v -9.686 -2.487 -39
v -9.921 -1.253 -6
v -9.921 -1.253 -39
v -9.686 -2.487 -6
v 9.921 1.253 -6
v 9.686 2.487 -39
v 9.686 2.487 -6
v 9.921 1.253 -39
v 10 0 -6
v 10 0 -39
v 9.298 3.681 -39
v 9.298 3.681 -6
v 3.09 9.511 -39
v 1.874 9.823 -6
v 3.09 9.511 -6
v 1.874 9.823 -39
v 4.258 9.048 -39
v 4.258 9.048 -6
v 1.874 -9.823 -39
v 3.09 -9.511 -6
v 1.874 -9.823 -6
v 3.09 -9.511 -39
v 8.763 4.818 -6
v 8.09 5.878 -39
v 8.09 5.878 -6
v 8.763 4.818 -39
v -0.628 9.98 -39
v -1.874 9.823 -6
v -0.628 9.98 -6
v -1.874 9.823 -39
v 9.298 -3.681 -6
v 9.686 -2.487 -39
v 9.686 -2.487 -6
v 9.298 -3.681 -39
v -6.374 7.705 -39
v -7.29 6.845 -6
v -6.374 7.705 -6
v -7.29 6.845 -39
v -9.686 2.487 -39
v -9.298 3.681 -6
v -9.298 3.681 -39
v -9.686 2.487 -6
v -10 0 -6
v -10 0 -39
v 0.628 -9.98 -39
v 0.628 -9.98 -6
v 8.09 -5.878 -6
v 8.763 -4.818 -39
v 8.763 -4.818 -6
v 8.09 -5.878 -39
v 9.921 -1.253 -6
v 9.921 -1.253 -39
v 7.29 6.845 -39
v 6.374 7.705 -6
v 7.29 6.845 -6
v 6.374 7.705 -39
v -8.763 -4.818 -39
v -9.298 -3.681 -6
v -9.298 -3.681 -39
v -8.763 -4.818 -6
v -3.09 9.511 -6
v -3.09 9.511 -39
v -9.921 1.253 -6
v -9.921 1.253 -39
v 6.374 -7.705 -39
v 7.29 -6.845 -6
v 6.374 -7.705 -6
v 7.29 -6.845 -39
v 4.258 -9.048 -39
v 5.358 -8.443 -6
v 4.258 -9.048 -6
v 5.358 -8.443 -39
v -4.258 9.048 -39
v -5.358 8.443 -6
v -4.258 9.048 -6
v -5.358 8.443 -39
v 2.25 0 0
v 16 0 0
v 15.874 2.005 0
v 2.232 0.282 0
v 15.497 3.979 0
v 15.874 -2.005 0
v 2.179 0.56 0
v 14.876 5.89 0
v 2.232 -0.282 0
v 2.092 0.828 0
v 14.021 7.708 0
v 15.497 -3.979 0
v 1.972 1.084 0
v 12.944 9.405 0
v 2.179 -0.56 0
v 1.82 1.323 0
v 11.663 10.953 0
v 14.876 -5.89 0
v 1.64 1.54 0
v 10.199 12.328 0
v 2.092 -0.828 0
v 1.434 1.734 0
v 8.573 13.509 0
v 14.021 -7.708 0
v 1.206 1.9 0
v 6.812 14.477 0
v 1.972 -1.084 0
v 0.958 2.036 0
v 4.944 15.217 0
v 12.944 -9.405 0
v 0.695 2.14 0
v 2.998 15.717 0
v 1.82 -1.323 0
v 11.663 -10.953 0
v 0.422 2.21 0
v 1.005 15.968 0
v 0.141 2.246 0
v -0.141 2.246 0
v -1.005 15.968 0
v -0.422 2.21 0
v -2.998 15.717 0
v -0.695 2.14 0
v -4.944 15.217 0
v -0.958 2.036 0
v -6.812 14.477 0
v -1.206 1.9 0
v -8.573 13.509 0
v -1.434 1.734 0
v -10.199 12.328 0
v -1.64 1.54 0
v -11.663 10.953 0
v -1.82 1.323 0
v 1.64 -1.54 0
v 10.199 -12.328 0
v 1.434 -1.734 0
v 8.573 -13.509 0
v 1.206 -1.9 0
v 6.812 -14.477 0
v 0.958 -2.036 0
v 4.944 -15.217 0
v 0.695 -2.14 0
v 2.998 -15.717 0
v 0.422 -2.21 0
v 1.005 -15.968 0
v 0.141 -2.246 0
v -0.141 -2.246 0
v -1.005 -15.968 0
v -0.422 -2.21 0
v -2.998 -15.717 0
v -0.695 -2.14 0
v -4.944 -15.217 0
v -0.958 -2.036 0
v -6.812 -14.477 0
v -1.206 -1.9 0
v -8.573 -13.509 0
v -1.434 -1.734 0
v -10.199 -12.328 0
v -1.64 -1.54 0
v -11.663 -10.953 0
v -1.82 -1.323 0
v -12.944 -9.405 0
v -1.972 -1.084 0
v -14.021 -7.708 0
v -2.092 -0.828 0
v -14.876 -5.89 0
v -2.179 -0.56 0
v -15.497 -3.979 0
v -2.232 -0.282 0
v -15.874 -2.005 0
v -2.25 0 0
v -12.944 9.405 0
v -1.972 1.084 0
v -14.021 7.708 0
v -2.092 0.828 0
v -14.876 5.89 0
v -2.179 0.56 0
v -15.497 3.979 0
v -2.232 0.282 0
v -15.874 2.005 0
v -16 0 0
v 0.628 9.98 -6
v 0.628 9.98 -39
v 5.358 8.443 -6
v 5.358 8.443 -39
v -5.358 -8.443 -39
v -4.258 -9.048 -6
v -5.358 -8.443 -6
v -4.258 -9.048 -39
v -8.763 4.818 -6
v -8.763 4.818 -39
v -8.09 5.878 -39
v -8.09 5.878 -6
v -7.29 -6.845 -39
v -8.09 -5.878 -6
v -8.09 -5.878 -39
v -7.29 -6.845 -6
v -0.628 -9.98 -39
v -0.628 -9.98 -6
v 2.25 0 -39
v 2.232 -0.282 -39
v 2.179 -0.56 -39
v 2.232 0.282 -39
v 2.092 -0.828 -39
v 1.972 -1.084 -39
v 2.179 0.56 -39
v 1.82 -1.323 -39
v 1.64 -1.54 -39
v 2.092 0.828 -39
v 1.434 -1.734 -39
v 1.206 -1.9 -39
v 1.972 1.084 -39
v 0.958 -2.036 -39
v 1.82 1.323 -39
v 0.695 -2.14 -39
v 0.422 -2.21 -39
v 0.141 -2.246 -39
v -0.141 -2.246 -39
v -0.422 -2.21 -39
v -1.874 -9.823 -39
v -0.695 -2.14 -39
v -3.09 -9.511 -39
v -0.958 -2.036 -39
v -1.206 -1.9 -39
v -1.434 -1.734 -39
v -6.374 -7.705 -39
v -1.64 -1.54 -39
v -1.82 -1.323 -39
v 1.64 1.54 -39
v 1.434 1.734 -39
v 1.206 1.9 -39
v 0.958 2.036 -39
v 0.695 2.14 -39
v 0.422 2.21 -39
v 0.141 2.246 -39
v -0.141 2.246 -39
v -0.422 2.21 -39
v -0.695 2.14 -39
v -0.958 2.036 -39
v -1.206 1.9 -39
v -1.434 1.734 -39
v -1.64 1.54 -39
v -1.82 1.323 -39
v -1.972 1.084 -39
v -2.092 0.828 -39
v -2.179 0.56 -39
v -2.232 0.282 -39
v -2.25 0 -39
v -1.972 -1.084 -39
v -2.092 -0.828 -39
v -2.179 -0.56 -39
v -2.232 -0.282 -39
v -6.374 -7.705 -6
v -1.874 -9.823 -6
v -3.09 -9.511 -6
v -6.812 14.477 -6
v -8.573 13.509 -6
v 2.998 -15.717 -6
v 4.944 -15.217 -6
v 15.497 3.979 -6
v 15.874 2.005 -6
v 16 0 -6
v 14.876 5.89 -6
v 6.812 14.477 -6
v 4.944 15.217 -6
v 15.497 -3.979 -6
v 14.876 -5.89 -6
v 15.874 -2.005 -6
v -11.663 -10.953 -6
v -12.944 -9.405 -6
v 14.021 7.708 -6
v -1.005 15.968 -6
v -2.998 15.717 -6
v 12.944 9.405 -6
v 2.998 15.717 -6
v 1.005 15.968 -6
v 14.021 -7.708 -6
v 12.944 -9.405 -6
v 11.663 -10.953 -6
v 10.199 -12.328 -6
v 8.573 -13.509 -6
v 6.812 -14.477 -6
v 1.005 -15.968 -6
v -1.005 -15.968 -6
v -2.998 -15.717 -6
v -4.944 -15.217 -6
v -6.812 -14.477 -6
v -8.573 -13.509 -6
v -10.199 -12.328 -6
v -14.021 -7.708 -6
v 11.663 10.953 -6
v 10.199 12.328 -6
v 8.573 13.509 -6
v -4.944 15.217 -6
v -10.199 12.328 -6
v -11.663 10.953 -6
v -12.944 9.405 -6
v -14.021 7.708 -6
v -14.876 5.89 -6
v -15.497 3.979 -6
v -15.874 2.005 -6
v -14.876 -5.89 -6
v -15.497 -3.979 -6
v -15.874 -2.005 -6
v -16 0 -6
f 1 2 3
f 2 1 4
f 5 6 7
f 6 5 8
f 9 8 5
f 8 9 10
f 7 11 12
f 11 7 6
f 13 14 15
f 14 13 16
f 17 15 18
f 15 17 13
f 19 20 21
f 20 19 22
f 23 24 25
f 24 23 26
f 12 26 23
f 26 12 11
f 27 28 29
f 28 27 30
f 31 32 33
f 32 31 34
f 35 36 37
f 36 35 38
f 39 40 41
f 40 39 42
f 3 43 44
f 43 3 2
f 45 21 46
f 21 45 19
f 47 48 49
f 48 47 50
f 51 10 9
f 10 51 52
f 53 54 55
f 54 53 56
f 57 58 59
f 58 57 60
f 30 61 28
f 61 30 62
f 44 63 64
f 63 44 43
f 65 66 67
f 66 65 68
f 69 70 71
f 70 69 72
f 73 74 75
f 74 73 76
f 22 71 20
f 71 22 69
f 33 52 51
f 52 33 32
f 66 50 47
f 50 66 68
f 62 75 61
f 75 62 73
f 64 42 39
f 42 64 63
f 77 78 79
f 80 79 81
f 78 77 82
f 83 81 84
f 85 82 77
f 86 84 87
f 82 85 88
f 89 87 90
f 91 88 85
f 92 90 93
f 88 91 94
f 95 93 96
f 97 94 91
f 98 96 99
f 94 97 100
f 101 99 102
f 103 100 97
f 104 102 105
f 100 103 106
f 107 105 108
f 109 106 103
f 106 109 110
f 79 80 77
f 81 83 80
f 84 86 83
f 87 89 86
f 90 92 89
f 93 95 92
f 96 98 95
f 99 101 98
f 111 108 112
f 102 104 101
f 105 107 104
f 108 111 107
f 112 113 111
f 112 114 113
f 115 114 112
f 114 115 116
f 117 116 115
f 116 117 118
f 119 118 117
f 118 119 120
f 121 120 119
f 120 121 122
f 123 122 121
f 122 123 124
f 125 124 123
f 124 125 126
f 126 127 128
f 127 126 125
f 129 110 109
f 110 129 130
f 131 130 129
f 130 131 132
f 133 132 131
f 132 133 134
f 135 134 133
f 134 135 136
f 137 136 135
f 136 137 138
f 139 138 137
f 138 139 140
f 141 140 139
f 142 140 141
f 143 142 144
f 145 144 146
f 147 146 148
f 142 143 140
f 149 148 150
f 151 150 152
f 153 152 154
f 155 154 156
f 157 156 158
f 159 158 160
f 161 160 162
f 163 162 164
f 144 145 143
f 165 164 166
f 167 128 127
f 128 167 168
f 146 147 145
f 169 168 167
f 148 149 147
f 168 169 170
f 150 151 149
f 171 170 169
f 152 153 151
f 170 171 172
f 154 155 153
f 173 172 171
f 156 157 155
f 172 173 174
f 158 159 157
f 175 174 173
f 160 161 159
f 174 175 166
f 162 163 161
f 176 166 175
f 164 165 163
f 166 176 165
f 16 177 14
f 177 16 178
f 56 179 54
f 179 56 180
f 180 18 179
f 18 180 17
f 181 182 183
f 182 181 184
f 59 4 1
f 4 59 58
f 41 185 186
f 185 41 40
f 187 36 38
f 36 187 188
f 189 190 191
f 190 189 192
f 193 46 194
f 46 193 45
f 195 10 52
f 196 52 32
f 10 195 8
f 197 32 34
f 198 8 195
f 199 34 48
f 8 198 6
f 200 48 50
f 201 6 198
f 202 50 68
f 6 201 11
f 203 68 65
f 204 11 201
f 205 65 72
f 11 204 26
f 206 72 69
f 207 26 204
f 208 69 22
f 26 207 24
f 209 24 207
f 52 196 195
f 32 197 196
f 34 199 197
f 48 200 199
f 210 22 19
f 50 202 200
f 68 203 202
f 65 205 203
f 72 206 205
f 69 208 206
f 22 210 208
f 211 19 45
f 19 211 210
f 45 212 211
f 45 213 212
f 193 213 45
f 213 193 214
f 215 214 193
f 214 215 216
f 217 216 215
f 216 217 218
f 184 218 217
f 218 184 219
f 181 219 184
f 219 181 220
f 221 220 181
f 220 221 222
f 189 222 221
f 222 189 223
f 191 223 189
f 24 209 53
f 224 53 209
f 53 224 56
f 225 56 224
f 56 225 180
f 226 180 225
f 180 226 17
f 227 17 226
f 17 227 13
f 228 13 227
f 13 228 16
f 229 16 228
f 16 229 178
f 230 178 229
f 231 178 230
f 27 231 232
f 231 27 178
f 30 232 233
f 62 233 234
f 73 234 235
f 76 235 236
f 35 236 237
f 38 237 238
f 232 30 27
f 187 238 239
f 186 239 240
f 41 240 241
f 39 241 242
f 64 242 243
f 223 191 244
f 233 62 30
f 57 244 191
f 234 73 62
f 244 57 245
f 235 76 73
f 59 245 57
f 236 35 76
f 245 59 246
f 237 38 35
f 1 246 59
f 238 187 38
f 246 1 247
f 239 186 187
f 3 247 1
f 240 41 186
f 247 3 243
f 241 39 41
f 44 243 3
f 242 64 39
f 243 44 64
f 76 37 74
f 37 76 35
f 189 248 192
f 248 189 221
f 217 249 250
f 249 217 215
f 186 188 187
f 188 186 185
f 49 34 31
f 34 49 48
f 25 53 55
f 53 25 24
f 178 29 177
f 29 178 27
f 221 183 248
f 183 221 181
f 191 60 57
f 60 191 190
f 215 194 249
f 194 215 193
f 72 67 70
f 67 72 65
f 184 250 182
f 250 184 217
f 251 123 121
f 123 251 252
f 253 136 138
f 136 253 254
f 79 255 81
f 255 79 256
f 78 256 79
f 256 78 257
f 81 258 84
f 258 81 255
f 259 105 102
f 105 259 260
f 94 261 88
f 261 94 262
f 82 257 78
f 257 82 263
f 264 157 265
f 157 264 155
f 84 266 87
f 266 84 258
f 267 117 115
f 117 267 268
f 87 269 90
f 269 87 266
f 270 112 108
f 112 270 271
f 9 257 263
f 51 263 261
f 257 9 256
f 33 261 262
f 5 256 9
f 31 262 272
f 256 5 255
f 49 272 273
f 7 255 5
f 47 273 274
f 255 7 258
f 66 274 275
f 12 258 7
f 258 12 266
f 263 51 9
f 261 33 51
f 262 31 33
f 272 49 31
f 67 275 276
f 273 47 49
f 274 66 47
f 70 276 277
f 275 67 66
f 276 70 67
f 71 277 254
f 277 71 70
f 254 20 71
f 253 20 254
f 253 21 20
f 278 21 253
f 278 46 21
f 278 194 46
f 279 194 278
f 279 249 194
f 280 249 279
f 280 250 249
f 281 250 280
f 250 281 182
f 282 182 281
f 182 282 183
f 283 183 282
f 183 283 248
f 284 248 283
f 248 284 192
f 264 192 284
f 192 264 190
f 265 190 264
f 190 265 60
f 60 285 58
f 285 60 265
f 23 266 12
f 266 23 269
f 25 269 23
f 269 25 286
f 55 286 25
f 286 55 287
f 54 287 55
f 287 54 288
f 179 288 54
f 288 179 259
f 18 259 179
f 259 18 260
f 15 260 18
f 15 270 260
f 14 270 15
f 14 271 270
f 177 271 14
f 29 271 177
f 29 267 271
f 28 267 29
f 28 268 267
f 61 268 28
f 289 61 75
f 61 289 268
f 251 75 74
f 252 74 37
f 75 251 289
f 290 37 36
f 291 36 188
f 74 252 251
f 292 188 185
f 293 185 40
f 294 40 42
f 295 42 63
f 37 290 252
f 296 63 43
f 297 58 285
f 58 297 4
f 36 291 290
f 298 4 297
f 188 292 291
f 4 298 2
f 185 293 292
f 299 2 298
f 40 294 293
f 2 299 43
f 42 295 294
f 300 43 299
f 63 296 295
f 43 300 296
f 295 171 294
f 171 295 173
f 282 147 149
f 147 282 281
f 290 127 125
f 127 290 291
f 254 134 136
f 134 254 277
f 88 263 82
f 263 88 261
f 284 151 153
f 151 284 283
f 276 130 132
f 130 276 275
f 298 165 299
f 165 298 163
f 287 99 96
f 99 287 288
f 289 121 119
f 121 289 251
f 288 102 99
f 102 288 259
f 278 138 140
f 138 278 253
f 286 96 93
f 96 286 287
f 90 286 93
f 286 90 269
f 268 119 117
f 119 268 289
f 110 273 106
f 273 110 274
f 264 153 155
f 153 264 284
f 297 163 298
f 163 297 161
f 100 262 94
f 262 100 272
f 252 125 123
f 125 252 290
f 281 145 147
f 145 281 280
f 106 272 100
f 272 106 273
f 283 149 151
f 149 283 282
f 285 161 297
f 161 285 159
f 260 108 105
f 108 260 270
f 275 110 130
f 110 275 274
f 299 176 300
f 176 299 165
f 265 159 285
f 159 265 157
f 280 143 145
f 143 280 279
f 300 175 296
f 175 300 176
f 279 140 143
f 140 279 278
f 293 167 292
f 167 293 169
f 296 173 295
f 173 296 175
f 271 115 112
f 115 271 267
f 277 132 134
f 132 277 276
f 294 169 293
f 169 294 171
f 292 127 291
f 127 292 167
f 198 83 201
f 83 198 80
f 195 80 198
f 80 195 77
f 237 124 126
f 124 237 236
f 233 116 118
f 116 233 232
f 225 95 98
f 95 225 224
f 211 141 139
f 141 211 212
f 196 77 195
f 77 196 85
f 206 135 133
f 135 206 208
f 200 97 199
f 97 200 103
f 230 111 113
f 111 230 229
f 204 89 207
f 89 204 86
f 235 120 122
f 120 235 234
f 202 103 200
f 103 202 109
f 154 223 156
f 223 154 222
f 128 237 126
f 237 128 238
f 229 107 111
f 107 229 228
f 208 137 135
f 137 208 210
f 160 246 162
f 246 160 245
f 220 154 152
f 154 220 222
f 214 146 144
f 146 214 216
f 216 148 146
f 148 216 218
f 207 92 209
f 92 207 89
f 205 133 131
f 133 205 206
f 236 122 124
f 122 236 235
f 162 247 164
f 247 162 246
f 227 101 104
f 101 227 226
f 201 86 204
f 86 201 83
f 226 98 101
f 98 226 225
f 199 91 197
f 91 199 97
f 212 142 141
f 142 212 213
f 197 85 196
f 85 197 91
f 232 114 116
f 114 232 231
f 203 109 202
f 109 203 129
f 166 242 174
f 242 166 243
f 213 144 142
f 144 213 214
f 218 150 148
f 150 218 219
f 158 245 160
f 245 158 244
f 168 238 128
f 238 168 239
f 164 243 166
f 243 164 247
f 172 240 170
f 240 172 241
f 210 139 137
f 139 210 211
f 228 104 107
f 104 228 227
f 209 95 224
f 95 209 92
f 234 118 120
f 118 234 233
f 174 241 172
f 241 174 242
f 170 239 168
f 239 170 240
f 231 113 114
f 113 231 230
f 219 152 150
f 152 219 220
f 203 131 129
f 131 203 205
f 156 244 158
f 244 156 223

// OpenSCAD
$fn = 50;


difference() {
	union() {
		translate(v = [0, 0, -39.0000000000]) {
			cylinder(h = 39, r = 10.0000000000);
		}
		translate(v = [0, 0, -6.0000000000]) {
			cylinder(h = 6, r = 16.0000000000);
		}
	}
	union() {
		#translate(v = [0, 0, -39]) {
			cylinder(h = 39, r = 2.2500000000);
		}
	}
}
